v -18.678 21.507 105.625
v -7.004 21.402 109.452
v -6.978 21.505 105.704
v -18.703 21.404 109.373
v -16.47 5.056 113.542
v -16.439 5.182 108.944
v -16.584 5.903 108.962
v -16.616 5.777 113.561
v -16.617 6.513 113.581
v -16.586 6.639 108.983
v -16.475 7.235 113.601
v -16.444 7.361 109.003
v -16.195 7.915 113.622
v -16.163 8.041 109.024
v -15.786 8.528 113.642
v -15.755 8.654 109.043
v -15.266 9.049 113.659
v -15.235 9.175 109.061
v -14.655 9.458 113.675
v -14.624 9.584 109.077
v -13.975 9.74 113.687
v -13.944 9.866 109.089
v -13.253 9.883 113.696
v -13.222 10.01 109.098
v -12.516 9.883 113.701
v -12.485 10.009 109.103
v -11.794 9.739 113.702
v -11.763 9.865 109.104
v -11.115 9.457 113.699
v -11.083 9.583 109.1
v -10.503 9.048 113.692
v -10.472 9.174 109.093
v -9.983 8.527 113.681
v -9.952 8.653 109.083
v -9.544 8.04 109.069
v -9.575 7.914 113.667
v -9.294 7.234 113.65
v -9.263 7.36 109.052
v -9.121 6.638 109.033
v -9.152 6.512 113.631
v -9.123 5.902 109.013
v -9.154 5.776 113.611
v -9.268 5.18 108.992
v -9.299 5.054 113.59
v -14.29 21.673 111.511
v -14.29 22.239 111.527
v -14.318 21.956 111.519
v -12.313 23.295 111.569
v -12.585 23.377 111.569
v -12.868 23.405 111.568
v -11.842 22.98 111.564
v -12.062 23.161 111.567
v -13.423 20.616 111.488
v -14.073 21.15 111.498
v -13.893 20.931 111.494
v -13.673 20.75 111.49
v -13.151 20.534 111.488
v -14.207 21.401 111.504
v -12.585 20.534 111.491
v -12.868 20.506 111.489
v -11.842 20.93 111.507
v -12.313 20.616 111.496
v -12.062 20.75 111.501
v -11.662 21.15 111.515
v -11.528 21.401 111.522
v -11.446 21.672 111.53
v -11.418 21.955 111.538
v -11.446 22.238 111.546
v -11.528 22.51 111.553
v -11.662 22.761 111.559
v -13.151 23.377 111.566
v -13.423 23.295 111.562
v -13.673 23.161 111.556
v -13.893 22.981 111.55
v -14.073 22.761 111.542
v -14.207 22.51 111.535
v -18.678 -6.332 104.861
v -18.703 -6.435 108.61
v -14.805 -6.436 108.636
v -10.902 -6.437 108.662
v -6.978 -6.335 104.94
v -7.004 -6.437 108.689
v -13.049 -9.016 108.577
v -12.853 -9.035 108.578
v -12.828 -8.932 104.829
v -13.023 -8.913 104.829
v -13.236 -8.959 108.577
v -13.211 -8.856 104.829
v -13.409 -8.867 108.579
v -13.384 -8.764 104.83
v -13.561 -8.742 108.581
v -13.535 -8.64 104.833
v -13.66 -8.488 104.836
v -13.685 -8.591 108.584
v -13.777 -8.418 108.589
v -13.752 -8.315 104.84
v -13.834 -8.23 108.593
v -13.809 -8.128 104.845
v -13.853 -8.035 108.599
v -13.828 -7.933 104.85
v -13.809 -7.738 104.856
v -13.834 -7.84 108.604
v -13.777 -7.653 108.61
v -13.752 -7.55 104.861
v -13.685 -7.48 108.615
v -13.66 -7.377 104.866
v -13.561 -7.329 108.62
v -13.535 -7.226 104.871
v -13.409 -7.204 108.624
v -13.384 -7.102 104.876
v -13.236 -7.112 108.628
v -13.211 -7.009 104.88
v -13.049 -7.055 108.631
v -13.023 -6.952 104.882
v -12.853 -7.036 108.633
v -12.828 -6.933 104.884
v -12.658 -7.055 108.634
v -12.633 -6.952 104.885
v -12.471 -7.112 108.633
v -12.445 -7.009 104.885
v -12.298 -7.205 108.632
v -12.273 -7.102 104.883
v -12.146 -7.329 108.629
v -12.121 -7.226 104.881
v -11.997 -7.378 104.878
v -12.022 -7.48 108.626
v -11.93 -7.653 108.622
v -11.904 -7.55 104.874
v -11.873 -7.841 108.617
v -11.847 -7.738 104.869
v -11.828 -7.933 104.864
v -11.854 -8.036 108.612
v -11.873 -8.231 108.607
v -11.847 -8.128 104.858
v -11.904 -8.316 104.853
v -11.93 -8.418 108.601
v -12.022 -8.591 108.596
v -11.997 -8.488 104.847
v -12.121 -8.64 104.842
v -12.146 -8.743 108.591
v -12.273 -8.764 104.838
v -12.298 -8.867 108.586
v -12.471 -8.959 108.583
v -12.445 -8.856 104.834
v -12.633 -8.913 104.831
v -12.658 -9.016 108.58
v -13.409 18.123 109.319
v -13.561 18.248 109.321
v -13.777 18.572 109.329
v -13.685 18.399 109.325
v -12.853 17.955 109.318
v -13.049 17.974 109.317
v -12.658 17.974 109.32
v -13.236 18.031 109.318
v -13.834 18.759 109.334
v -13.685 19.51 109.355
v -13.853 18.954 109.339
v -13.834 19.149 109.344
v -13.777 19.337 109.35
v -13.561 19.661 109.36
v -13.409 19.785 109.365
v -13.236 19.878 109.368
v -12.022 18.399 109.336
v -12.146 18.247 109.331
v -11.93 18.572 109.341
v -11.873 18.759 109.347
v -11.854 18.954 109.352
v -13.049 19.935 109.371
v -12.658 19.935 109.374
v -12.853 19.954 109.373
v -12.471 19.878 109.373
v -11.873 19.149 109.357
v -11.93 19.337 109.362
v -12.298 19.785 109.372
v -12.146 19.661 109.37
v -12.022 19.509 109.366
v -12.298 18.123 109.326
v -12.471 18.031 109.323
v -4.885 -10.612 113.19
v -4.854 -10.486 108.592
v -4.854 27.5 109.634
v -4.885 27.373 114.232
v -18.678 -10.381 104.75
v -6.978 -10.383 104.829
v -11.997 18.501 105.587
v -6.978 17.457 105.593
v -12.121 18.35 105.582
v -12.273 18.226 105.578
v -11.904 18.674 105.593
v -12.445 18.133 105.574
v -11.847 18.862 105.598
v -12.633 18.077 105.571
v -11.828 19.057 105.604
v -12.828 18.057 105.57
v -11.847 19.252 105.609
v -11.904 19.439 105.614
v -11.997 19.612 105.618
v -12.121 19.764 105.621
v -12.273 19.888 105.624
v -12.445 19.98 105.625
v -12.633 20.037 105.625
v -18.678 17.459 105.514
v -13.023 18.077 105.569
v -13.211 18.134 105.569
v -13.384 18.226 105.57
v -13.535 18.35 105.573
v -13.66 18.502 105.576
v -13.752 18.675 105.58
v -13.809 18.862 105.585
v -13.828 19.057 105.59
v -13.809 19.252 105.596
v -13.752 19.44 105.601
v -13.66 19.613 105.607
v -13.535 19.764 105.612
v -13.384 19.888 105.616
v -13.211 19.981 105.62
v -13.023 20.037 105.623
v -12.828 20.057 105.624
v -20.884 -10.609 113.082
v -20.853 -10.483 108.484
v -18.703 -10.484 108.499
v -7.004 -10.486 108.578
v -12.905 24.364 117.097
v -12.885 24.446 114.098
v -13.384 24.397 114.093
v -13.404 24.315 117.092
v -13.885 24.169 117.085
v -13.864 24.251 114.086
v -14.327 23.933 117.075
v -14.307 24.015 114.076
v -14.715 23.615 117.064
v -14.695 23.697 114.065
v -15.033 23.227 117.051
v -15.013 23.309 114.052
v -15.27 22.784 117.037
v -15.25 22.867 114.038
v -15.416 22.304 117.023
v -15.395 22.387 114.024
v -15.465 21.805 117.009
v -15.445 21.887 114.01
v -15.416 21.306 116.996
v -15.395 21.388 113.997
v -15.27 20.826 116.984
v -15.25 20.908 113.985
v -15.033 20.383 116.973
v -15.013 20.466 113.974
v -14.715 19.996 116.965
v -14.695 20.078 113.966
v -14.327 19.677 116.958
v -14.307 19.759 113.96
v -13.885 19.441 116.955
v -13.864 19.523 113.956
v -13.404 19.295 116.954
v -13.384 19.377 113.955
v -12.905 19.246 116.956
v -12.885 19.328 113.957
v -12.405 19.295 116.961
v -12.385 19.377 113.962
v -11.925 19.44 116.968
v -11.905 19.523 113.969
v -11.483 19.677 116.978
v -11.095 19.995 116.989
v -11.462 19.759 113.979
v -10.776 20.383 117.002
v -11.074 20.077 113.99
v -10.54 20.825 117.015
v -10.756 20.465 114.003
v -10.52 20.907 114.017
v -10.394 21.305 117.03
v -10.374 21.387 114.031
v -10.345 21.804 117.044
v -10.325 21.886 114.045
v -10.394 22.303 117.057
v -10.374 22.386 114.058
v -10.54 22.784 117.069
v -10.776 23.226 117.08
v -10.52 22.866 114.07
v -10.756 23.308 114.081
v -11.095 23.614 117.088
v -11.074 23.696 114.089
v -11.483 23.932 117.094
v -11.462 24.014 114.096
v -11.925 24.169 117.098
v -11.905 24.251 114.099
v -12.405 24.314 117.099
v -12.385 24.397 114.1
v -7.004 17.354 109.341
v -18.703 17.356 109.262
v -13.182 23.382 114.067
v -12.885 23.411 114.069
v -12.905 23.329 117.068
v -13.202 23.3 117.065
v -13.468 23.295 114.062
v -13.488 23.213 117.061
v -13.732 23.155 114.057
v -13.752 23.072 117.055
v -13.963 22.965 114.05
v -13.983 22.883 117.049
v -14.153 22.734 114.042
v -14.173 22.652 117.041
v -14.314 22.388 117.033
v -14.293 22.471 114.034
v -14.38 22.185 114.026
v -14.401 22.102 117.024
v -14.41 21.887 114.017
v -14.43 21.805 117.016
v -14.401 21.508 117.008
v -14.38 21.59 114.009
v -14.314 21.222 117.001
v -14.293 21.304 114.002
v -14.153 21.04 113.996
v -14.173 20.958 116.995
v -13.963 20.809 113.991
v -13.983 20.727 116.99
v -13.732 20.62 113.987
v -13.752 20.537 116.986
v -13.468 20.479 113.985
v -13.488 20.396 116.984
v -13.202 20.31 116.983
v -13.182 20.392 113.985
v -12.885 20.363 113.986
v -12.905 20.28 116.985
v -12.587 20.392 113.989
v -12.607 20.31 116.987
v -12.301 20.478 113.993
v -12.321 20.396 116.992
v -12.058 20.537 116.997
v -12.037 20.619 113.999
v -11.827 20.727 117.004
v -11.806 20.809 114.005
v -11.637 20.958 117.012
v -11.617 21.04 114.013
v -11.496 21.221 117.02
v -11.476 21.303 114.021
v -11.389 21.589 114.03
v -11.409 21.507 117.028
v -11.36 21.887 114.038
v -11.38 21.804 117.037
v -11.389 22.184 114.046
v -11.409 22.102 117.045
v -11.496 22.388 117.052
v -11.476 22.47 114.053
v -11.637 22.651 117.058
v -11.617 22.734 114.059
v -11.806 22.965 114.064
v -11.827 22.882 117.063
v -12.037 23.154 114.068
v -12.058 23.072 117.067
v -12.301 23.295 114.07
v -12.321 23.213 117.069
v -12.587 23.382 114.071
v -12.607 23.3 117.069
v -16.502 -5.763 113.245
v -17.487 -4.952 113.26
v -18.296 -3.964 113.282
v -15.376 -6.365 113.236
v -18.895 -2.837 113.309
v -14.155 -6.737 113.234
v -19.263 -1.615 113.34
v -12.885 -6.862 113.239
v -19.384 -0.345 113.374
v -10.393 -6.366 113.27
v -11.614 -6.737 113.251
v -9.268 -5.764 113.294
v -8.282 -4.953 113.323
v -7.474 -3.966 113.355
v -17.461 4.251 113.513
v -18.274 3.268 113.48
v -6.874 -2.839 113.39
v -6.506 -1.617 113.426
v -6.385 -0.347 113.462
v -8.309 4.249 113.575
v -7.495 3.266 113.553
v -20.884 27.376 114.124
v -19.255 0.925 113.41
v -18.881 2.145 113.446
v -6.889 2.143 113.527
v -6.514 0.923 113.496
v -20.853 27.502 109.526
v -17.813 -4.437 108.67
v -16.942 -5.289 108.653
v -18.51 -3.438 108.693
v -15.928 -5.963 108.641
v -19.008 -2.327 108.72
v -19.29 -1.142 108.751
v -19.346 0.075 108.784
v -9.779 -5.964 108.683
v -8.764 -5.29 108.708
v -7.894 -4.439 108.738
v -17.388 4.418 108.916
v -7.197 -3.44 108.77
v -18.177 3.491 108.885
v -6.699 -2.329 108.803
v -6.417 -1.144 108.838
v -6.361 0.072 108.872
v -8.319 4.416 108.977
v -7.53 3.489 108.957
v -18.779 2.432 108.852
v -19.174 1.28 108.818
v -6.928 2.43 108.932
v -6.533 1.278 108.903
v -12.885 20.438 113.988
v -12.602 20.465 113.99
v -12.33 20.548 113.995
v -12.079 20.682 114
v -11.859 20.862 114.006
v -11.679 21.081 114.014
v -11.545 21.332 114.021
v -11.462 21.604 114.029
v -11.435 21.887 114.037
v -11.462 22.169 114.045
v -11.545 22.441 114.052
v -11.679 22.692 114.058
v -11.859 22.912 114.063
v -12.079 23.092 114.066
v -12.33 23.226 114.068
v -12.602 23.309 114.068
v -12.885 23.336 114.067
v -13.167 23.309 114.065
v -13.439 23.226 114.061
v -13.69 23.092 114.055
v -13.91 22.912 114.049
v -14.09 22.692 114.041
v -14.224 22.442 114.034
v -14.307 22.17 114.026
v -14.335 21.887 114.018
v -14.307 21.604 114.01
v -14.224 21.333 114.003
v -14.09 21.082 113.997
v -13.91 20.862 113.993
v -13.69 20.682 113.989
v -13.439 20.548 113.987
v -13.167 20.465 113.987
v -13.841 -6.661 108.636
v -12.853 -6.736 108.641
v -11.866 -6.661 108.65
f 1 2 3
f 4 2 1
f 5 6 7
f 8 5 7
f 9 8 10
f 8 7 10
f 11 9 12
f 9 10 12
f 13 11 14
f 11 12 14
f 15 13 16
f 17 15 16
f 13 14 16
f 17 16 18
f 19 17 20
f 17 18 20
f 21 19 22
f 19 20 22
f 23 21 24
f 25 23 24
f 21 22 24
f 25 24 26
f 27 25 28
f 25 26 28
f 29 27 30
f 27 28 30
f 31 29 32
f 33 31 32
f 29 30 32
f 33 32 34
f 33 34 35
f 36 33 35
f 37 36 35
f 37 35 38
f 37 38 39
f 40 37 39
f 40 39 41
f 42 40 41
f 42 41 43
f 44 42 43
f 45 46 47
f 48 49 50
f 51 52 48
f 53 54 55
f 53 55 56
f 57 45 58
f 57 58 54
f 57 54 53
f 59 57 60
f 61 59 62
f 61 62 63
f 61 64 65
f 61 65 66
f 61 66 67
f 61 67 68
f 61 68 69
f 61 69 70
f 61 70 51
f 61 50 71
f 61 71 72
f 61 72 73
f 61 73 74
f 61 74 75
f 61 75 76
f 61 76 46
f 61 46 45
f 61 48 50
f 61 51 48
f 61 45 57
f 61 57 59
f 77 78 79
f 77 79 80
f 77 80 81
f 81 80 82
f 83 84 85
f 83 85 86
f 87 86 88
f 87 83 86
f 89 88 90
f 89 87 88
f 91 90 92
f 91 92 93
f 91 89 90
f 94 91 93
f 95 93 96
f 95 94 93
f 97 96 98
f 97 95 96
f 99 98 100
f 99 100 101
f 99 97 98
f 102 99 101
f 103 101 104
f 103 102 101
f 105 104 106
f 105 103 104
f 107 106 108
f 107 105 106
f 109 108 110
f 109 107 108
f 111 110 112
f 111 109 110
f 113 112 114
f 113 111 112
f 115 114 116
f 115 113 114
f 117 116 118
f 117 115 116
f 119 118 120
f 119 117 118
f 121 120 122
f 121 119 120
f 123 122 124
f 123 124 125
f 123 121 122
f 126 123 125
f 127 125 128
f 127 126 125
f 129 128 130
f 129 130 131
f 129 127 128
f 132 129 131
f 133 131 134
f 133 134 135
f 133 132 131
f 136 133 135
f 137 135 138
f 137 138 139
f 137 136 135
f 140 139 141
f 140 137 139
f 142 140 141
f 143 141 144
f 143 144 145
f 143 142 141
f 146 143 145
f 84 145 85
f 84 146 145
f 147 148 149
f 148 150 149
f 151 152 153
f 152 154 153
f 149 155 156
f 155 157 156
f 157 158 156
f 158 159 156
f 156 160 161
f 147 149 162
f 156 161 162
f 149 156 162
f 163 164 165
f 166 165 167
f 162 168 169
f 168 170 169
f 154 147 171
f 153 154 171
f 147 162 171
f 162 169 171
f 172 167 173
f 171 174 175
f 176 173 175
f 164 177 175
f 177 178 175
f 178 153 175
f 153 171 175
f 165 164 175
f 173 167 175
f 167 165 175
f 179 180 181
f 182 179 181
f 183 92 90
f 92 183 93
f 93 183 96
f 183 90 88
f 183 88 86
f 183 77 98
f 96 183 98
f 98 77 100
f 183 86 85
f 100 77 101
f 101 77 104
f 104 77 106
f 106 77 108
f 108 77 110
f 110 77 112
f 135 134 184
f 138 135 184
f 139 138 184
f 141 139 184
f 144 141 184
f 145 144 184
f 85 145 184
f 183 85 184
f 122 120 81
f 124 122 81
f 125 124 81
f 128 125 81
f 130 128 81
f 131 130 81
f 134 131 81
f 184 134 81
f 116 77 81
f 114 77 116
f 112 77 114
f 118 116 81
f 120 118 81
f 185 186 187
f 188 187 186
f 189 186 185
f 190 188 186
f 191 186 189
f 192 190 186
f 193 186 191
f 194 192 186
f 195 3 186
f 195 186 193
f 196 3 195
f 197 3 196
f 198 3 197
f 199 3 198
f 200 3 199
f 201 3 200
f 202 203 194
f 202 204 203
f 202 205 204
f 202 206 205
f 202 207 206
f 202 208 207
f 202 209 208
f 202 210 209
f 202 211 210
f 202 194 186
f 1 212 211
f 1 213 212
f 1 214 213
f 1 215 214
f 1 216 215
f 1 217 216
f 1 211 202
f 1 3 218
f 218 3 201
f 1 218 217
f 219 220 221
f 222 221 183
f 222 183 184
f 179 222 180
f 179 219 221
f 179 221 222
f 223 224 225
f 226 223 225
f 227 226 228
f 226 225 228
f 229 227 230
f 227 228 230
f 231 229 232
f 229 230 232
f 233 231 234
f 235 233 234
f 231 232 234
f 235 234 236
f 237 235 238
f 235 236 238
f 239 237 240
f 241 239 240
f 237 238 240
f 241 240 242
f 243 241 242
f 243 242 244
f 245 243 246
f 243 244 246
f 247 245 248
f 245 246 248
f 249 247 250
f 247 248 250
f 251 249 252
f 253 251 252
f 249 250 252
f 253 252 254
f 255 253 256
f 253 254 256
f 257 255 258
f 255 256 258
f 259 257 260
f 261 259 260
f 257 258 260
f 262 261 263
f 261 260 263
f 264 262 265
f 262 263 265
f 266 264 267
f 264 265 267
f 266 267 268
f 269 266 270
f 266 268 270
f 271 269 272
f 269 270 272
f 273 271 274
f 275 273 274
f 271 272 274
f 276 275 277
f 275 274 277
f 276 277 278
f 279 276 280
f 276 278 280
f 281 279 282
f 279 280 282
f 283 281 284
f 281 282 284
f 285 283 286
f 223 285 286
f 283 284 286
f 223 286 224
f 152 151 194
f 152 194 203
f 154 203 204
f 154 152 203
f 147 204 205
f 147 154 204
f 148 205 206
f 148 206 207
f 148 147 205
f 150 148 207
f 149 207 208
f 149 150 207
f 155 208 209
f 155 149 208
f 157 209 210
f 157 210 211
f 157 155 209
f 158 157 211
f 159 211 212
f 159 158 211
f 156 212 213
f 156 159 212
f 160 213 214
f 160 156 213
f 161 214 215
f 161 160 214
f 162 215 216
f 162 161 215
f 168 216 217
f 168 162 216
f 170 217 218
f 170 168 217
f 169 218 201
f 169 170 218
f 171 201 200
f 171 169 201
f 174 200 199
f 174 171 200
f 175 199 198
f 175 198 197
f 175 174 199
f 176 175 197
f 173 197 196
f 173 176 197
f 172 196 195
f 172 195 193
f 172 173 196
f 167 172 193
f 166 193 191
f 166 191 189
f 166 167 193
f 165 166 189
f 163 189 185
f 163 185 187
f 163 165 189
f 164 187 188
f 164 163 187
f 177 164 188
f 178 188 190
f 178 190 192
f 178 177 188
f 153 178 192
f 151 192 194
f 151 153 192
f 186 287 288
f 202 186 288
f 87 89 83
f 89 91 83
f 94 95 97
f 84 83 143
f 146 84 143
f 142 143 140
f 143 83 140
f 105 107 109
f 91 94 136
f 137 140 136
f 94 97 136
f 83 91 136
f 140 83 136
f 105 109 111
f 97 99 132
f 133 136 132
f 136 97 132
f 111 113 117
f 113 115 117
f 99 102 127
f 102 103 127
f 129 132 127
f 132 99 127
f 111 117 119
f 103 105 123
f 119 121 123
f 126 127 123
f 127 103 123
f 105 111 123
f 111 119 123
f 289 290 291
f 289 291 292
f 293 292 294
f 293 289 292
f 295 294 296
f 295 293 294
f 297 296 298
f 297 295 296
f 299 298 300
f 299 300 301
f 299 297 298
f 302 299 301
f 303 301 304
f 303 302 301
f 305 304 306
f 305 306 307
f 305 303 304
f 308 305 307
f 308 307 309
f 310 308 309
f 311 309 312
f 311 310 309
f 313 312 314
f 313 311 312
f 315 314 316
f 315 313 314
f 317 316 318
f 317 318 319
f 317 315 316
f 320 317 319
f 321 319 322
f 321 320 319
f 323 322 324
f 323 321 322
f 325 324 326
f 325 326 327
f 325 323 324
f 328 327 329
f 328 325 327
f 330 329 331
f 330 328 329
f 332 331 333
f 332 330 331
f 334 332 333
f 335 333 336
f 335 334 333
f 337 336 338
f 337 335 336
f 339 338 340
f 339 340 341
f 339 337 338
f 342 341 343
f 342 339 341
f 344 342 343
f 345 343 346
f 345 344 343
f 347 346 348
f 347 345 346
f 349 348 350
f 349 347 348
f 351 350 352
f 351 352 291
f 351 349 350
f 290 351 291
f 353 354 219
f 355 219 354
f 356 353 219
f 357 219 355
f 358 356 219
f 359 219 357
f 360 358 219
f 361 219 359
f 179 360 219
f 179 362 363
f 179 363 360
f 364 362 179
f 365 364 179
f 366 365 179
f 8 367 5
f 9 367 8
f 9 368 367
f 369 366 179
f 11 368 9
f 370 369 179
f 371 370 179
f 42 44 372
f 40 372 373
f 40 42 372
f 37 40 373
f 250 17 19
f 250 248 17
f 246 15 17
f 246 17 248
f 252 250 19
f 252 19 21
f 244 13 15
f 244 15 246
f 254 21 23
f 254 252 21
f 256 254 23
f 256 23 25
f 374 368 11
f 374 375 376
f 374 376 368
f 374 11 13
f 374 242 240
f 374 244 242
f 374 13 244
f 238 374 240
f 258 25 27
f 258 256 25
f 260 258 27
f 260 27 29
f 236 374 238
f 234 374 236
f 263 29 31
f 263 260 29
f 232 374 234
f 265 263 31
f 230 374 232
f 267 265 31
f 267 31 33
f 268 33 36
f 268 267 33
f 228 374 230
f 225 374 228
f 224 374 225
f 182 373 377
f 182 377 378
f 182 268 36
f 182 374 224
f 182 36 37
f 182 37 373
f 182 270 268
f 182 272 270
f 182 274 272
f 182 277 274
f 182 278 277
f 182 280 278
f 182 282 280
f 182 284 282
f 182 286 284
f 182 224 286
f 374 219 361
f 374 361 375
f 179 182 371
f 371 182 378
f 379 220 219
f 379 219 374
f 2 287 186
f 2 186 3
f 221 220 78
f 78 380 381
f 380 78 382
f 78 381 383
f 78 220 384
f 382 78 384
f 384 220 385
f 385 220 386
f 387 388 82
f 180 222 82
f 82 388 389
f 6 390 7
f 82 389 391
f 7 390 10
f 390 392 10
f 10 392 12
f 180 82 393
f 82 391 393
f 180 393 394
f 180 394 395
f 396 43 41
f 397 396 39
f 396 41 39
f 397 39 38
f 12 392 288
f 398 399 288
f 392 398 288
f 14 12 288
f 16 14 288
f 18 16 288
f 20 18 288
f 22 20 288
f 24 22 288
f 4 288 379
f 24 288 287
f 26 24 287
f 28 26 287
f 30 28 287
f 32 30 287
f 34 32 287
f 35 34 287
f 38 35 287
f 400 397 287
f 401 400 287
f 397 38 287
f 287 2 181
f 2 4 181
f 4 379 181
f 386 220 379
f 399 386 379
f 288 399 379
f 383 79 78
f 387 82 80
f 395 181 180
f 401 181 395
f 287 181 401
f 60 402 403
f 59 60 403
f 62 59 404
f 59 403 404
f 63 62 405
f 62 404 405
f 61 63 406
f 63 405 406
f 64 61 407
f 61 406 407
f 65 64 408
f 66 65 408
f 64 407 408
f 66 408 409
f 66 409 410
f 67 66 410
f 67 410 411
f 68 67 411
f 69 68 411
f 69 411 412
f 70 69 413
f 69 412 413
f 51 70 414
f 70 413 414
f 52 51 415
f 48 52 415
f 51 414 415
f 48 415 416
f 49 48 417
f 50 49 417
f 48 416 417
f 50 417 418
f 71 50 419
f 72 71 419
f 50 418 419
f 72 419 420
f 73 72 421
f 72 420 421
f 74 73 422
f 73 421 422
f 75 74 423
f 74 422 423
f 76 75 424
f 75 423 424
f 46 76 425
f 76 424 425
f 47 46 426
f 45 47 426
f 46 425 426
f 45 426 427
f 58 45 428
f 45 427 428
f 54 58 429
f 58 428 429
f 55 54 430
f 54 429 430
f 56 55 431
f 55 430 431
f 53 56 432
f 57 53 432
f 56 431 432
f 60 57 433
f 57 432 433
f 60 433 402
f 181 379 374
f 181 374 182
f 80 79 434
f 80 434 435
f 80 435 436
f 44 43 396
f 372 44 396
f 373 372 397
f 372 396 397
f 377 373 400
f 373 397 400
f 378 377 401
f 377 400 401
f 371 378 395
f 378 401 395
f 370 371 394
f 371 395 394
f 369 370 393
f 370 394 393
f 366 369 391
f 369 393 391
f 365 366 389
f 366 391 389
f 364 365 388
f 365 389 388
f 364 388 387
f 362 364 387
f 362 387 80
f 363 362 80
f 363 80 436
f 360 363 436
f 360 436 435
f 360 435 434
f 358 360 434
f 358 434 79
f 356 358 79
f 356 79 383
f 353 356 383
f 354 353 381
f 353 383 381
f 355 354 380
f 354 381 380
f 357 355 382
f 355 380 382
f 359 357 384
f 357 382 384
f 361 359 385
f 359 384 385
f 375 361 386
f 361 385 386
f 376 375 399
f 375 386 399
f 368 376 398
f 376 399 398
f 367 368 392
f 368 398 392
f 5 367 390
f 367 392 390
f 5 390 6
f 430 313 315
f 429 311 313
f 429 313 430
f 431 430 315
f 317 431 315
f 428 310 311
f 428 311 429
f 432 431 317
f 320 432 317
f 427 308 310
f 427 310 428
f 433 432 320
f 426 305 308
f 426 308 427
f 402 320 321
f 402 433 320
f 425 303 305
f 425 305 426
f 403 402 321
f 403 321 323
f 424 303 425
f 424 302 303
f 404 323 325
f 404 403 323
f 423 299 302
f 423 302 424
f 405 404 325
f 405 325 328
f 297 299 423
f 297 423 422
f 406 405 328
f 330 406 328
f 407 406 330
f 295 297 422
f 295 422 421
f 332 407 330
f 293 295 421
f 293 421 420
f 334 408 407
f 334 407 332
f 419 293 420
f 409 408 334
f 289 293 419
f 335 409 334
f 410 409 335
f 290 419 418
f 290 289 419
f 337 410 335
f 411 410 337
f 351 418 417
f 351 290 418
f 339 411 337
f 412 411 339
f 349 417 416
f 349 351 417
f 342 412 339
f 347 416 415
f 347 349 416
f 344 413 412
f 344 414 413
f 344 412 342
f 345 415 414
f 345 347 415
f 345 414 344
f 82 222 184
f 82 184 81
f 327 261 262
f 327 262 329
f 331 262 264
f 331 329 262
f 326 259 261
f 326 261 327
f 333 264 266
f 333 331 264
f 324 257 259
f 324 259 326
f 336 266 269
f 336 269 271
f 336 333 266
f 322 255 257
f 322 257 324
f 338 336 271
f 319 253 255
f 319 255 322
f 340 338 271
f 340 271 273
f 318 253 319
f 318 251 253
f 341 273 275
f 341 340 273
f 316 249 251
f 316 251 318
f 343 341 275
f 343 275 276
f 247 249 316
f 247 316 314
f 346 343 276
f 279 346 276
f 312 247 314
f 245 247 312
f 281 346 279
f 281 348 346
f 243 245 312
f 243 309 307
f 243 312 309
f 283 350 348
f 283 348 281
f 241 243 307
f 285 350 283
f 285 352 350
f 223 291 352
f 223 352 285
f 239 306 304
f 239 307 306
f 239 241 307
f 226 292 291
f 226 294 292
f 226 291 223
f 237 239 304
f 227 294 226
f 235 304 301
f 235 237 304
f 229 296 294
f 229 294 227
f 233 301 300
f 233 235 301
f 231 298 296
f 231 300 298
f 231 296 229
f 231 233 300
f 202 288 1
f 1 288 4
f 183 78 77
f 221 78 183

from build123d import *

# Parameters (mm, degrees)
SKETCH_1_W          = 16
SKETCH_1_H          = 38
EXTRUDE_1_DEPTH     = 4.6
CUT_EXTRUDE_3_REACH = 38.941
SKETCH_6_W          = 11.7
SKETCH_6_H          = 4.05
SKETCH_6_R          = 1
EXTRUDE_2_DEPTH     = 3.75
SKETCH_9_R          = 2.56
SKETCH_9_R_2        = 1.525
EXTRUDE_3_DEPTH     = 3
SKETCH_10_R         = 1.45
CUT_EXTRUDE_5_DEPTH = 2.5


with BuildPart() as part:
    # 草图1 → 凸台-拉伸1 (new body)
    with BuildSketch(Plane(origin=(-0.735865771, -2.984459331, 108.825789607), x_dir=(0.9999771565250809, -0.00018529520807729263, 0.006756633311043236), z_dir=(-0.006759173619166435, -0.027413258740008984, 0.9996013339413065))):
        with Locations((-12.117906651, 11.494673284)):
            Rectangle(SKETCH_1_W, SKETCH_1_H)
    extrude(amount=EXTRUDE_1_DEPTH)

    # 草图5 → 切除-拉伸3 (cut, up to next)
    with BuildSketch(Plane(origin=(-0.735865771, -2.984459331, 108.825789607), x_dir=(-0.9999771565250809, 0.0001852952080772962, -0.006756633311043381), z_dir=(0.00675917361916658, 0.02741325874000909, -0.9996013339413065)), mode=Mode.PRIVATE) as cut_extrude_3_sk1:
        with BuildLine():
            ThreePointArc((15.703441088, 8.166291382), (12.117906651, 13.014673284), (8.532372214, 8.166291382))
            ThreePointArc((8.532372214, 8.166291382), (12.117906651, -3.755326716), (15.703441088, 8.166291382))
        make_face()
    cut_extrude_3_tool1 = extrude(cut_extrude_3_sk1.sketch, amount=-CUT_EXTRUDE_3_REACH, mode=Mode.PRIVATE) & part.part
    add(cut_extrude_3_tool1.solids().sort_by_distance((-12.853496, 1.00994, 108.853395))[0], mode=Mode.SUBTRACT)

    # 草图6 → 凸台-拉伸2 (add)
    # profile 1 of 2: a face of its own
    with BuildSketch(Plane(origin=(-0.735865771, -2.984459331, 108.825789607), x_dir=(-0.9999771565250809, 0.0001852952080772936, -0.0067566333110433766), z_dir=(0.006759173619166576, 0.02741325874000879, -0.9996013339413065))):
        with Locations((12.117906651, 22.369673284)):
            Rectangle(SKETCH_6_W, SKETCH_6_H)
        with Locations(Location((12.117906651, 21.944673284, 0), (0, 0, 270))):
            Circle(SKETCH_6_R, mode=Mode.SUBTRACT)
    # profile 2 of 2: a face of its own
    with BuildSketch(Plane(origin=(-0.735865771, -2.984459331, 108.825789607), x_dir=(-0.9999771565250809, 0.0001852952080772936, -0.0067566333110433766), z_dir=(0.006759173619166576, 0.02741325874000879, -0.9996013339413065))):
        Polygon((7.267906651, -3.455326716), (17.967906651, -3.455326716), (17.967906651, -7.505326716), (6.267906651, -7.505326716), (6.267906651, -3.455326716), align=None)
        with Locations(Location((12.117906651, -5.055326716, 0), (0, 0, 270))):
            Circle(SKETCH_6_R, mode=Mode.SUBTRACT)
    extrude(amount=EXTRUDE_2_DEPTH)

    # 草图9 → 凸台-拉伸3 (add)
    with BuildSketch(Plane(origin=(-0.76695797, -3.110560321, 113.423955744), x_dir=(0.9999771565250809, -0.00018529520807729366, 0.006756633311043378), z_dir=(-0.006759173619166578, -0.02741325874000878, 0.9996013339413065))):
        with Locations(Location((-12.117906651, 25.004673284, 0), (0, 0, 90))):
            Circle(SKETCH_9_R)
        with Locations(Location((-12.117906651, 25.004673284, 0), (0, 0, 90))):
            Circle(SKETCH_9_R_2, mode=Mode.SUBTRACT)
    extrude(amount=EXTRUDE_3_DEPTH)

    # 草图10 → 切除-拉伸5 (cut)
    with BuildSketch(Plane(origin=(-0.76695797, -3.110560321, 113.423955744), x_dir=(0.9999771565250809, -0.00018529520807729366, 0.006756633311043378), z_dir=(-0.006759173619166578, -0.02741325874000879, 0.9996013339413065))):
        with Locations(Location((-12.117906651, 25.004673284, 0), (0, 0, 270))):
            Circle(SKETCH_10_R)
    extrude(amount=-CUT_EXTRUDE_5_DEPTH, mode=Mode.SUBTRACT)


solid = part.part
